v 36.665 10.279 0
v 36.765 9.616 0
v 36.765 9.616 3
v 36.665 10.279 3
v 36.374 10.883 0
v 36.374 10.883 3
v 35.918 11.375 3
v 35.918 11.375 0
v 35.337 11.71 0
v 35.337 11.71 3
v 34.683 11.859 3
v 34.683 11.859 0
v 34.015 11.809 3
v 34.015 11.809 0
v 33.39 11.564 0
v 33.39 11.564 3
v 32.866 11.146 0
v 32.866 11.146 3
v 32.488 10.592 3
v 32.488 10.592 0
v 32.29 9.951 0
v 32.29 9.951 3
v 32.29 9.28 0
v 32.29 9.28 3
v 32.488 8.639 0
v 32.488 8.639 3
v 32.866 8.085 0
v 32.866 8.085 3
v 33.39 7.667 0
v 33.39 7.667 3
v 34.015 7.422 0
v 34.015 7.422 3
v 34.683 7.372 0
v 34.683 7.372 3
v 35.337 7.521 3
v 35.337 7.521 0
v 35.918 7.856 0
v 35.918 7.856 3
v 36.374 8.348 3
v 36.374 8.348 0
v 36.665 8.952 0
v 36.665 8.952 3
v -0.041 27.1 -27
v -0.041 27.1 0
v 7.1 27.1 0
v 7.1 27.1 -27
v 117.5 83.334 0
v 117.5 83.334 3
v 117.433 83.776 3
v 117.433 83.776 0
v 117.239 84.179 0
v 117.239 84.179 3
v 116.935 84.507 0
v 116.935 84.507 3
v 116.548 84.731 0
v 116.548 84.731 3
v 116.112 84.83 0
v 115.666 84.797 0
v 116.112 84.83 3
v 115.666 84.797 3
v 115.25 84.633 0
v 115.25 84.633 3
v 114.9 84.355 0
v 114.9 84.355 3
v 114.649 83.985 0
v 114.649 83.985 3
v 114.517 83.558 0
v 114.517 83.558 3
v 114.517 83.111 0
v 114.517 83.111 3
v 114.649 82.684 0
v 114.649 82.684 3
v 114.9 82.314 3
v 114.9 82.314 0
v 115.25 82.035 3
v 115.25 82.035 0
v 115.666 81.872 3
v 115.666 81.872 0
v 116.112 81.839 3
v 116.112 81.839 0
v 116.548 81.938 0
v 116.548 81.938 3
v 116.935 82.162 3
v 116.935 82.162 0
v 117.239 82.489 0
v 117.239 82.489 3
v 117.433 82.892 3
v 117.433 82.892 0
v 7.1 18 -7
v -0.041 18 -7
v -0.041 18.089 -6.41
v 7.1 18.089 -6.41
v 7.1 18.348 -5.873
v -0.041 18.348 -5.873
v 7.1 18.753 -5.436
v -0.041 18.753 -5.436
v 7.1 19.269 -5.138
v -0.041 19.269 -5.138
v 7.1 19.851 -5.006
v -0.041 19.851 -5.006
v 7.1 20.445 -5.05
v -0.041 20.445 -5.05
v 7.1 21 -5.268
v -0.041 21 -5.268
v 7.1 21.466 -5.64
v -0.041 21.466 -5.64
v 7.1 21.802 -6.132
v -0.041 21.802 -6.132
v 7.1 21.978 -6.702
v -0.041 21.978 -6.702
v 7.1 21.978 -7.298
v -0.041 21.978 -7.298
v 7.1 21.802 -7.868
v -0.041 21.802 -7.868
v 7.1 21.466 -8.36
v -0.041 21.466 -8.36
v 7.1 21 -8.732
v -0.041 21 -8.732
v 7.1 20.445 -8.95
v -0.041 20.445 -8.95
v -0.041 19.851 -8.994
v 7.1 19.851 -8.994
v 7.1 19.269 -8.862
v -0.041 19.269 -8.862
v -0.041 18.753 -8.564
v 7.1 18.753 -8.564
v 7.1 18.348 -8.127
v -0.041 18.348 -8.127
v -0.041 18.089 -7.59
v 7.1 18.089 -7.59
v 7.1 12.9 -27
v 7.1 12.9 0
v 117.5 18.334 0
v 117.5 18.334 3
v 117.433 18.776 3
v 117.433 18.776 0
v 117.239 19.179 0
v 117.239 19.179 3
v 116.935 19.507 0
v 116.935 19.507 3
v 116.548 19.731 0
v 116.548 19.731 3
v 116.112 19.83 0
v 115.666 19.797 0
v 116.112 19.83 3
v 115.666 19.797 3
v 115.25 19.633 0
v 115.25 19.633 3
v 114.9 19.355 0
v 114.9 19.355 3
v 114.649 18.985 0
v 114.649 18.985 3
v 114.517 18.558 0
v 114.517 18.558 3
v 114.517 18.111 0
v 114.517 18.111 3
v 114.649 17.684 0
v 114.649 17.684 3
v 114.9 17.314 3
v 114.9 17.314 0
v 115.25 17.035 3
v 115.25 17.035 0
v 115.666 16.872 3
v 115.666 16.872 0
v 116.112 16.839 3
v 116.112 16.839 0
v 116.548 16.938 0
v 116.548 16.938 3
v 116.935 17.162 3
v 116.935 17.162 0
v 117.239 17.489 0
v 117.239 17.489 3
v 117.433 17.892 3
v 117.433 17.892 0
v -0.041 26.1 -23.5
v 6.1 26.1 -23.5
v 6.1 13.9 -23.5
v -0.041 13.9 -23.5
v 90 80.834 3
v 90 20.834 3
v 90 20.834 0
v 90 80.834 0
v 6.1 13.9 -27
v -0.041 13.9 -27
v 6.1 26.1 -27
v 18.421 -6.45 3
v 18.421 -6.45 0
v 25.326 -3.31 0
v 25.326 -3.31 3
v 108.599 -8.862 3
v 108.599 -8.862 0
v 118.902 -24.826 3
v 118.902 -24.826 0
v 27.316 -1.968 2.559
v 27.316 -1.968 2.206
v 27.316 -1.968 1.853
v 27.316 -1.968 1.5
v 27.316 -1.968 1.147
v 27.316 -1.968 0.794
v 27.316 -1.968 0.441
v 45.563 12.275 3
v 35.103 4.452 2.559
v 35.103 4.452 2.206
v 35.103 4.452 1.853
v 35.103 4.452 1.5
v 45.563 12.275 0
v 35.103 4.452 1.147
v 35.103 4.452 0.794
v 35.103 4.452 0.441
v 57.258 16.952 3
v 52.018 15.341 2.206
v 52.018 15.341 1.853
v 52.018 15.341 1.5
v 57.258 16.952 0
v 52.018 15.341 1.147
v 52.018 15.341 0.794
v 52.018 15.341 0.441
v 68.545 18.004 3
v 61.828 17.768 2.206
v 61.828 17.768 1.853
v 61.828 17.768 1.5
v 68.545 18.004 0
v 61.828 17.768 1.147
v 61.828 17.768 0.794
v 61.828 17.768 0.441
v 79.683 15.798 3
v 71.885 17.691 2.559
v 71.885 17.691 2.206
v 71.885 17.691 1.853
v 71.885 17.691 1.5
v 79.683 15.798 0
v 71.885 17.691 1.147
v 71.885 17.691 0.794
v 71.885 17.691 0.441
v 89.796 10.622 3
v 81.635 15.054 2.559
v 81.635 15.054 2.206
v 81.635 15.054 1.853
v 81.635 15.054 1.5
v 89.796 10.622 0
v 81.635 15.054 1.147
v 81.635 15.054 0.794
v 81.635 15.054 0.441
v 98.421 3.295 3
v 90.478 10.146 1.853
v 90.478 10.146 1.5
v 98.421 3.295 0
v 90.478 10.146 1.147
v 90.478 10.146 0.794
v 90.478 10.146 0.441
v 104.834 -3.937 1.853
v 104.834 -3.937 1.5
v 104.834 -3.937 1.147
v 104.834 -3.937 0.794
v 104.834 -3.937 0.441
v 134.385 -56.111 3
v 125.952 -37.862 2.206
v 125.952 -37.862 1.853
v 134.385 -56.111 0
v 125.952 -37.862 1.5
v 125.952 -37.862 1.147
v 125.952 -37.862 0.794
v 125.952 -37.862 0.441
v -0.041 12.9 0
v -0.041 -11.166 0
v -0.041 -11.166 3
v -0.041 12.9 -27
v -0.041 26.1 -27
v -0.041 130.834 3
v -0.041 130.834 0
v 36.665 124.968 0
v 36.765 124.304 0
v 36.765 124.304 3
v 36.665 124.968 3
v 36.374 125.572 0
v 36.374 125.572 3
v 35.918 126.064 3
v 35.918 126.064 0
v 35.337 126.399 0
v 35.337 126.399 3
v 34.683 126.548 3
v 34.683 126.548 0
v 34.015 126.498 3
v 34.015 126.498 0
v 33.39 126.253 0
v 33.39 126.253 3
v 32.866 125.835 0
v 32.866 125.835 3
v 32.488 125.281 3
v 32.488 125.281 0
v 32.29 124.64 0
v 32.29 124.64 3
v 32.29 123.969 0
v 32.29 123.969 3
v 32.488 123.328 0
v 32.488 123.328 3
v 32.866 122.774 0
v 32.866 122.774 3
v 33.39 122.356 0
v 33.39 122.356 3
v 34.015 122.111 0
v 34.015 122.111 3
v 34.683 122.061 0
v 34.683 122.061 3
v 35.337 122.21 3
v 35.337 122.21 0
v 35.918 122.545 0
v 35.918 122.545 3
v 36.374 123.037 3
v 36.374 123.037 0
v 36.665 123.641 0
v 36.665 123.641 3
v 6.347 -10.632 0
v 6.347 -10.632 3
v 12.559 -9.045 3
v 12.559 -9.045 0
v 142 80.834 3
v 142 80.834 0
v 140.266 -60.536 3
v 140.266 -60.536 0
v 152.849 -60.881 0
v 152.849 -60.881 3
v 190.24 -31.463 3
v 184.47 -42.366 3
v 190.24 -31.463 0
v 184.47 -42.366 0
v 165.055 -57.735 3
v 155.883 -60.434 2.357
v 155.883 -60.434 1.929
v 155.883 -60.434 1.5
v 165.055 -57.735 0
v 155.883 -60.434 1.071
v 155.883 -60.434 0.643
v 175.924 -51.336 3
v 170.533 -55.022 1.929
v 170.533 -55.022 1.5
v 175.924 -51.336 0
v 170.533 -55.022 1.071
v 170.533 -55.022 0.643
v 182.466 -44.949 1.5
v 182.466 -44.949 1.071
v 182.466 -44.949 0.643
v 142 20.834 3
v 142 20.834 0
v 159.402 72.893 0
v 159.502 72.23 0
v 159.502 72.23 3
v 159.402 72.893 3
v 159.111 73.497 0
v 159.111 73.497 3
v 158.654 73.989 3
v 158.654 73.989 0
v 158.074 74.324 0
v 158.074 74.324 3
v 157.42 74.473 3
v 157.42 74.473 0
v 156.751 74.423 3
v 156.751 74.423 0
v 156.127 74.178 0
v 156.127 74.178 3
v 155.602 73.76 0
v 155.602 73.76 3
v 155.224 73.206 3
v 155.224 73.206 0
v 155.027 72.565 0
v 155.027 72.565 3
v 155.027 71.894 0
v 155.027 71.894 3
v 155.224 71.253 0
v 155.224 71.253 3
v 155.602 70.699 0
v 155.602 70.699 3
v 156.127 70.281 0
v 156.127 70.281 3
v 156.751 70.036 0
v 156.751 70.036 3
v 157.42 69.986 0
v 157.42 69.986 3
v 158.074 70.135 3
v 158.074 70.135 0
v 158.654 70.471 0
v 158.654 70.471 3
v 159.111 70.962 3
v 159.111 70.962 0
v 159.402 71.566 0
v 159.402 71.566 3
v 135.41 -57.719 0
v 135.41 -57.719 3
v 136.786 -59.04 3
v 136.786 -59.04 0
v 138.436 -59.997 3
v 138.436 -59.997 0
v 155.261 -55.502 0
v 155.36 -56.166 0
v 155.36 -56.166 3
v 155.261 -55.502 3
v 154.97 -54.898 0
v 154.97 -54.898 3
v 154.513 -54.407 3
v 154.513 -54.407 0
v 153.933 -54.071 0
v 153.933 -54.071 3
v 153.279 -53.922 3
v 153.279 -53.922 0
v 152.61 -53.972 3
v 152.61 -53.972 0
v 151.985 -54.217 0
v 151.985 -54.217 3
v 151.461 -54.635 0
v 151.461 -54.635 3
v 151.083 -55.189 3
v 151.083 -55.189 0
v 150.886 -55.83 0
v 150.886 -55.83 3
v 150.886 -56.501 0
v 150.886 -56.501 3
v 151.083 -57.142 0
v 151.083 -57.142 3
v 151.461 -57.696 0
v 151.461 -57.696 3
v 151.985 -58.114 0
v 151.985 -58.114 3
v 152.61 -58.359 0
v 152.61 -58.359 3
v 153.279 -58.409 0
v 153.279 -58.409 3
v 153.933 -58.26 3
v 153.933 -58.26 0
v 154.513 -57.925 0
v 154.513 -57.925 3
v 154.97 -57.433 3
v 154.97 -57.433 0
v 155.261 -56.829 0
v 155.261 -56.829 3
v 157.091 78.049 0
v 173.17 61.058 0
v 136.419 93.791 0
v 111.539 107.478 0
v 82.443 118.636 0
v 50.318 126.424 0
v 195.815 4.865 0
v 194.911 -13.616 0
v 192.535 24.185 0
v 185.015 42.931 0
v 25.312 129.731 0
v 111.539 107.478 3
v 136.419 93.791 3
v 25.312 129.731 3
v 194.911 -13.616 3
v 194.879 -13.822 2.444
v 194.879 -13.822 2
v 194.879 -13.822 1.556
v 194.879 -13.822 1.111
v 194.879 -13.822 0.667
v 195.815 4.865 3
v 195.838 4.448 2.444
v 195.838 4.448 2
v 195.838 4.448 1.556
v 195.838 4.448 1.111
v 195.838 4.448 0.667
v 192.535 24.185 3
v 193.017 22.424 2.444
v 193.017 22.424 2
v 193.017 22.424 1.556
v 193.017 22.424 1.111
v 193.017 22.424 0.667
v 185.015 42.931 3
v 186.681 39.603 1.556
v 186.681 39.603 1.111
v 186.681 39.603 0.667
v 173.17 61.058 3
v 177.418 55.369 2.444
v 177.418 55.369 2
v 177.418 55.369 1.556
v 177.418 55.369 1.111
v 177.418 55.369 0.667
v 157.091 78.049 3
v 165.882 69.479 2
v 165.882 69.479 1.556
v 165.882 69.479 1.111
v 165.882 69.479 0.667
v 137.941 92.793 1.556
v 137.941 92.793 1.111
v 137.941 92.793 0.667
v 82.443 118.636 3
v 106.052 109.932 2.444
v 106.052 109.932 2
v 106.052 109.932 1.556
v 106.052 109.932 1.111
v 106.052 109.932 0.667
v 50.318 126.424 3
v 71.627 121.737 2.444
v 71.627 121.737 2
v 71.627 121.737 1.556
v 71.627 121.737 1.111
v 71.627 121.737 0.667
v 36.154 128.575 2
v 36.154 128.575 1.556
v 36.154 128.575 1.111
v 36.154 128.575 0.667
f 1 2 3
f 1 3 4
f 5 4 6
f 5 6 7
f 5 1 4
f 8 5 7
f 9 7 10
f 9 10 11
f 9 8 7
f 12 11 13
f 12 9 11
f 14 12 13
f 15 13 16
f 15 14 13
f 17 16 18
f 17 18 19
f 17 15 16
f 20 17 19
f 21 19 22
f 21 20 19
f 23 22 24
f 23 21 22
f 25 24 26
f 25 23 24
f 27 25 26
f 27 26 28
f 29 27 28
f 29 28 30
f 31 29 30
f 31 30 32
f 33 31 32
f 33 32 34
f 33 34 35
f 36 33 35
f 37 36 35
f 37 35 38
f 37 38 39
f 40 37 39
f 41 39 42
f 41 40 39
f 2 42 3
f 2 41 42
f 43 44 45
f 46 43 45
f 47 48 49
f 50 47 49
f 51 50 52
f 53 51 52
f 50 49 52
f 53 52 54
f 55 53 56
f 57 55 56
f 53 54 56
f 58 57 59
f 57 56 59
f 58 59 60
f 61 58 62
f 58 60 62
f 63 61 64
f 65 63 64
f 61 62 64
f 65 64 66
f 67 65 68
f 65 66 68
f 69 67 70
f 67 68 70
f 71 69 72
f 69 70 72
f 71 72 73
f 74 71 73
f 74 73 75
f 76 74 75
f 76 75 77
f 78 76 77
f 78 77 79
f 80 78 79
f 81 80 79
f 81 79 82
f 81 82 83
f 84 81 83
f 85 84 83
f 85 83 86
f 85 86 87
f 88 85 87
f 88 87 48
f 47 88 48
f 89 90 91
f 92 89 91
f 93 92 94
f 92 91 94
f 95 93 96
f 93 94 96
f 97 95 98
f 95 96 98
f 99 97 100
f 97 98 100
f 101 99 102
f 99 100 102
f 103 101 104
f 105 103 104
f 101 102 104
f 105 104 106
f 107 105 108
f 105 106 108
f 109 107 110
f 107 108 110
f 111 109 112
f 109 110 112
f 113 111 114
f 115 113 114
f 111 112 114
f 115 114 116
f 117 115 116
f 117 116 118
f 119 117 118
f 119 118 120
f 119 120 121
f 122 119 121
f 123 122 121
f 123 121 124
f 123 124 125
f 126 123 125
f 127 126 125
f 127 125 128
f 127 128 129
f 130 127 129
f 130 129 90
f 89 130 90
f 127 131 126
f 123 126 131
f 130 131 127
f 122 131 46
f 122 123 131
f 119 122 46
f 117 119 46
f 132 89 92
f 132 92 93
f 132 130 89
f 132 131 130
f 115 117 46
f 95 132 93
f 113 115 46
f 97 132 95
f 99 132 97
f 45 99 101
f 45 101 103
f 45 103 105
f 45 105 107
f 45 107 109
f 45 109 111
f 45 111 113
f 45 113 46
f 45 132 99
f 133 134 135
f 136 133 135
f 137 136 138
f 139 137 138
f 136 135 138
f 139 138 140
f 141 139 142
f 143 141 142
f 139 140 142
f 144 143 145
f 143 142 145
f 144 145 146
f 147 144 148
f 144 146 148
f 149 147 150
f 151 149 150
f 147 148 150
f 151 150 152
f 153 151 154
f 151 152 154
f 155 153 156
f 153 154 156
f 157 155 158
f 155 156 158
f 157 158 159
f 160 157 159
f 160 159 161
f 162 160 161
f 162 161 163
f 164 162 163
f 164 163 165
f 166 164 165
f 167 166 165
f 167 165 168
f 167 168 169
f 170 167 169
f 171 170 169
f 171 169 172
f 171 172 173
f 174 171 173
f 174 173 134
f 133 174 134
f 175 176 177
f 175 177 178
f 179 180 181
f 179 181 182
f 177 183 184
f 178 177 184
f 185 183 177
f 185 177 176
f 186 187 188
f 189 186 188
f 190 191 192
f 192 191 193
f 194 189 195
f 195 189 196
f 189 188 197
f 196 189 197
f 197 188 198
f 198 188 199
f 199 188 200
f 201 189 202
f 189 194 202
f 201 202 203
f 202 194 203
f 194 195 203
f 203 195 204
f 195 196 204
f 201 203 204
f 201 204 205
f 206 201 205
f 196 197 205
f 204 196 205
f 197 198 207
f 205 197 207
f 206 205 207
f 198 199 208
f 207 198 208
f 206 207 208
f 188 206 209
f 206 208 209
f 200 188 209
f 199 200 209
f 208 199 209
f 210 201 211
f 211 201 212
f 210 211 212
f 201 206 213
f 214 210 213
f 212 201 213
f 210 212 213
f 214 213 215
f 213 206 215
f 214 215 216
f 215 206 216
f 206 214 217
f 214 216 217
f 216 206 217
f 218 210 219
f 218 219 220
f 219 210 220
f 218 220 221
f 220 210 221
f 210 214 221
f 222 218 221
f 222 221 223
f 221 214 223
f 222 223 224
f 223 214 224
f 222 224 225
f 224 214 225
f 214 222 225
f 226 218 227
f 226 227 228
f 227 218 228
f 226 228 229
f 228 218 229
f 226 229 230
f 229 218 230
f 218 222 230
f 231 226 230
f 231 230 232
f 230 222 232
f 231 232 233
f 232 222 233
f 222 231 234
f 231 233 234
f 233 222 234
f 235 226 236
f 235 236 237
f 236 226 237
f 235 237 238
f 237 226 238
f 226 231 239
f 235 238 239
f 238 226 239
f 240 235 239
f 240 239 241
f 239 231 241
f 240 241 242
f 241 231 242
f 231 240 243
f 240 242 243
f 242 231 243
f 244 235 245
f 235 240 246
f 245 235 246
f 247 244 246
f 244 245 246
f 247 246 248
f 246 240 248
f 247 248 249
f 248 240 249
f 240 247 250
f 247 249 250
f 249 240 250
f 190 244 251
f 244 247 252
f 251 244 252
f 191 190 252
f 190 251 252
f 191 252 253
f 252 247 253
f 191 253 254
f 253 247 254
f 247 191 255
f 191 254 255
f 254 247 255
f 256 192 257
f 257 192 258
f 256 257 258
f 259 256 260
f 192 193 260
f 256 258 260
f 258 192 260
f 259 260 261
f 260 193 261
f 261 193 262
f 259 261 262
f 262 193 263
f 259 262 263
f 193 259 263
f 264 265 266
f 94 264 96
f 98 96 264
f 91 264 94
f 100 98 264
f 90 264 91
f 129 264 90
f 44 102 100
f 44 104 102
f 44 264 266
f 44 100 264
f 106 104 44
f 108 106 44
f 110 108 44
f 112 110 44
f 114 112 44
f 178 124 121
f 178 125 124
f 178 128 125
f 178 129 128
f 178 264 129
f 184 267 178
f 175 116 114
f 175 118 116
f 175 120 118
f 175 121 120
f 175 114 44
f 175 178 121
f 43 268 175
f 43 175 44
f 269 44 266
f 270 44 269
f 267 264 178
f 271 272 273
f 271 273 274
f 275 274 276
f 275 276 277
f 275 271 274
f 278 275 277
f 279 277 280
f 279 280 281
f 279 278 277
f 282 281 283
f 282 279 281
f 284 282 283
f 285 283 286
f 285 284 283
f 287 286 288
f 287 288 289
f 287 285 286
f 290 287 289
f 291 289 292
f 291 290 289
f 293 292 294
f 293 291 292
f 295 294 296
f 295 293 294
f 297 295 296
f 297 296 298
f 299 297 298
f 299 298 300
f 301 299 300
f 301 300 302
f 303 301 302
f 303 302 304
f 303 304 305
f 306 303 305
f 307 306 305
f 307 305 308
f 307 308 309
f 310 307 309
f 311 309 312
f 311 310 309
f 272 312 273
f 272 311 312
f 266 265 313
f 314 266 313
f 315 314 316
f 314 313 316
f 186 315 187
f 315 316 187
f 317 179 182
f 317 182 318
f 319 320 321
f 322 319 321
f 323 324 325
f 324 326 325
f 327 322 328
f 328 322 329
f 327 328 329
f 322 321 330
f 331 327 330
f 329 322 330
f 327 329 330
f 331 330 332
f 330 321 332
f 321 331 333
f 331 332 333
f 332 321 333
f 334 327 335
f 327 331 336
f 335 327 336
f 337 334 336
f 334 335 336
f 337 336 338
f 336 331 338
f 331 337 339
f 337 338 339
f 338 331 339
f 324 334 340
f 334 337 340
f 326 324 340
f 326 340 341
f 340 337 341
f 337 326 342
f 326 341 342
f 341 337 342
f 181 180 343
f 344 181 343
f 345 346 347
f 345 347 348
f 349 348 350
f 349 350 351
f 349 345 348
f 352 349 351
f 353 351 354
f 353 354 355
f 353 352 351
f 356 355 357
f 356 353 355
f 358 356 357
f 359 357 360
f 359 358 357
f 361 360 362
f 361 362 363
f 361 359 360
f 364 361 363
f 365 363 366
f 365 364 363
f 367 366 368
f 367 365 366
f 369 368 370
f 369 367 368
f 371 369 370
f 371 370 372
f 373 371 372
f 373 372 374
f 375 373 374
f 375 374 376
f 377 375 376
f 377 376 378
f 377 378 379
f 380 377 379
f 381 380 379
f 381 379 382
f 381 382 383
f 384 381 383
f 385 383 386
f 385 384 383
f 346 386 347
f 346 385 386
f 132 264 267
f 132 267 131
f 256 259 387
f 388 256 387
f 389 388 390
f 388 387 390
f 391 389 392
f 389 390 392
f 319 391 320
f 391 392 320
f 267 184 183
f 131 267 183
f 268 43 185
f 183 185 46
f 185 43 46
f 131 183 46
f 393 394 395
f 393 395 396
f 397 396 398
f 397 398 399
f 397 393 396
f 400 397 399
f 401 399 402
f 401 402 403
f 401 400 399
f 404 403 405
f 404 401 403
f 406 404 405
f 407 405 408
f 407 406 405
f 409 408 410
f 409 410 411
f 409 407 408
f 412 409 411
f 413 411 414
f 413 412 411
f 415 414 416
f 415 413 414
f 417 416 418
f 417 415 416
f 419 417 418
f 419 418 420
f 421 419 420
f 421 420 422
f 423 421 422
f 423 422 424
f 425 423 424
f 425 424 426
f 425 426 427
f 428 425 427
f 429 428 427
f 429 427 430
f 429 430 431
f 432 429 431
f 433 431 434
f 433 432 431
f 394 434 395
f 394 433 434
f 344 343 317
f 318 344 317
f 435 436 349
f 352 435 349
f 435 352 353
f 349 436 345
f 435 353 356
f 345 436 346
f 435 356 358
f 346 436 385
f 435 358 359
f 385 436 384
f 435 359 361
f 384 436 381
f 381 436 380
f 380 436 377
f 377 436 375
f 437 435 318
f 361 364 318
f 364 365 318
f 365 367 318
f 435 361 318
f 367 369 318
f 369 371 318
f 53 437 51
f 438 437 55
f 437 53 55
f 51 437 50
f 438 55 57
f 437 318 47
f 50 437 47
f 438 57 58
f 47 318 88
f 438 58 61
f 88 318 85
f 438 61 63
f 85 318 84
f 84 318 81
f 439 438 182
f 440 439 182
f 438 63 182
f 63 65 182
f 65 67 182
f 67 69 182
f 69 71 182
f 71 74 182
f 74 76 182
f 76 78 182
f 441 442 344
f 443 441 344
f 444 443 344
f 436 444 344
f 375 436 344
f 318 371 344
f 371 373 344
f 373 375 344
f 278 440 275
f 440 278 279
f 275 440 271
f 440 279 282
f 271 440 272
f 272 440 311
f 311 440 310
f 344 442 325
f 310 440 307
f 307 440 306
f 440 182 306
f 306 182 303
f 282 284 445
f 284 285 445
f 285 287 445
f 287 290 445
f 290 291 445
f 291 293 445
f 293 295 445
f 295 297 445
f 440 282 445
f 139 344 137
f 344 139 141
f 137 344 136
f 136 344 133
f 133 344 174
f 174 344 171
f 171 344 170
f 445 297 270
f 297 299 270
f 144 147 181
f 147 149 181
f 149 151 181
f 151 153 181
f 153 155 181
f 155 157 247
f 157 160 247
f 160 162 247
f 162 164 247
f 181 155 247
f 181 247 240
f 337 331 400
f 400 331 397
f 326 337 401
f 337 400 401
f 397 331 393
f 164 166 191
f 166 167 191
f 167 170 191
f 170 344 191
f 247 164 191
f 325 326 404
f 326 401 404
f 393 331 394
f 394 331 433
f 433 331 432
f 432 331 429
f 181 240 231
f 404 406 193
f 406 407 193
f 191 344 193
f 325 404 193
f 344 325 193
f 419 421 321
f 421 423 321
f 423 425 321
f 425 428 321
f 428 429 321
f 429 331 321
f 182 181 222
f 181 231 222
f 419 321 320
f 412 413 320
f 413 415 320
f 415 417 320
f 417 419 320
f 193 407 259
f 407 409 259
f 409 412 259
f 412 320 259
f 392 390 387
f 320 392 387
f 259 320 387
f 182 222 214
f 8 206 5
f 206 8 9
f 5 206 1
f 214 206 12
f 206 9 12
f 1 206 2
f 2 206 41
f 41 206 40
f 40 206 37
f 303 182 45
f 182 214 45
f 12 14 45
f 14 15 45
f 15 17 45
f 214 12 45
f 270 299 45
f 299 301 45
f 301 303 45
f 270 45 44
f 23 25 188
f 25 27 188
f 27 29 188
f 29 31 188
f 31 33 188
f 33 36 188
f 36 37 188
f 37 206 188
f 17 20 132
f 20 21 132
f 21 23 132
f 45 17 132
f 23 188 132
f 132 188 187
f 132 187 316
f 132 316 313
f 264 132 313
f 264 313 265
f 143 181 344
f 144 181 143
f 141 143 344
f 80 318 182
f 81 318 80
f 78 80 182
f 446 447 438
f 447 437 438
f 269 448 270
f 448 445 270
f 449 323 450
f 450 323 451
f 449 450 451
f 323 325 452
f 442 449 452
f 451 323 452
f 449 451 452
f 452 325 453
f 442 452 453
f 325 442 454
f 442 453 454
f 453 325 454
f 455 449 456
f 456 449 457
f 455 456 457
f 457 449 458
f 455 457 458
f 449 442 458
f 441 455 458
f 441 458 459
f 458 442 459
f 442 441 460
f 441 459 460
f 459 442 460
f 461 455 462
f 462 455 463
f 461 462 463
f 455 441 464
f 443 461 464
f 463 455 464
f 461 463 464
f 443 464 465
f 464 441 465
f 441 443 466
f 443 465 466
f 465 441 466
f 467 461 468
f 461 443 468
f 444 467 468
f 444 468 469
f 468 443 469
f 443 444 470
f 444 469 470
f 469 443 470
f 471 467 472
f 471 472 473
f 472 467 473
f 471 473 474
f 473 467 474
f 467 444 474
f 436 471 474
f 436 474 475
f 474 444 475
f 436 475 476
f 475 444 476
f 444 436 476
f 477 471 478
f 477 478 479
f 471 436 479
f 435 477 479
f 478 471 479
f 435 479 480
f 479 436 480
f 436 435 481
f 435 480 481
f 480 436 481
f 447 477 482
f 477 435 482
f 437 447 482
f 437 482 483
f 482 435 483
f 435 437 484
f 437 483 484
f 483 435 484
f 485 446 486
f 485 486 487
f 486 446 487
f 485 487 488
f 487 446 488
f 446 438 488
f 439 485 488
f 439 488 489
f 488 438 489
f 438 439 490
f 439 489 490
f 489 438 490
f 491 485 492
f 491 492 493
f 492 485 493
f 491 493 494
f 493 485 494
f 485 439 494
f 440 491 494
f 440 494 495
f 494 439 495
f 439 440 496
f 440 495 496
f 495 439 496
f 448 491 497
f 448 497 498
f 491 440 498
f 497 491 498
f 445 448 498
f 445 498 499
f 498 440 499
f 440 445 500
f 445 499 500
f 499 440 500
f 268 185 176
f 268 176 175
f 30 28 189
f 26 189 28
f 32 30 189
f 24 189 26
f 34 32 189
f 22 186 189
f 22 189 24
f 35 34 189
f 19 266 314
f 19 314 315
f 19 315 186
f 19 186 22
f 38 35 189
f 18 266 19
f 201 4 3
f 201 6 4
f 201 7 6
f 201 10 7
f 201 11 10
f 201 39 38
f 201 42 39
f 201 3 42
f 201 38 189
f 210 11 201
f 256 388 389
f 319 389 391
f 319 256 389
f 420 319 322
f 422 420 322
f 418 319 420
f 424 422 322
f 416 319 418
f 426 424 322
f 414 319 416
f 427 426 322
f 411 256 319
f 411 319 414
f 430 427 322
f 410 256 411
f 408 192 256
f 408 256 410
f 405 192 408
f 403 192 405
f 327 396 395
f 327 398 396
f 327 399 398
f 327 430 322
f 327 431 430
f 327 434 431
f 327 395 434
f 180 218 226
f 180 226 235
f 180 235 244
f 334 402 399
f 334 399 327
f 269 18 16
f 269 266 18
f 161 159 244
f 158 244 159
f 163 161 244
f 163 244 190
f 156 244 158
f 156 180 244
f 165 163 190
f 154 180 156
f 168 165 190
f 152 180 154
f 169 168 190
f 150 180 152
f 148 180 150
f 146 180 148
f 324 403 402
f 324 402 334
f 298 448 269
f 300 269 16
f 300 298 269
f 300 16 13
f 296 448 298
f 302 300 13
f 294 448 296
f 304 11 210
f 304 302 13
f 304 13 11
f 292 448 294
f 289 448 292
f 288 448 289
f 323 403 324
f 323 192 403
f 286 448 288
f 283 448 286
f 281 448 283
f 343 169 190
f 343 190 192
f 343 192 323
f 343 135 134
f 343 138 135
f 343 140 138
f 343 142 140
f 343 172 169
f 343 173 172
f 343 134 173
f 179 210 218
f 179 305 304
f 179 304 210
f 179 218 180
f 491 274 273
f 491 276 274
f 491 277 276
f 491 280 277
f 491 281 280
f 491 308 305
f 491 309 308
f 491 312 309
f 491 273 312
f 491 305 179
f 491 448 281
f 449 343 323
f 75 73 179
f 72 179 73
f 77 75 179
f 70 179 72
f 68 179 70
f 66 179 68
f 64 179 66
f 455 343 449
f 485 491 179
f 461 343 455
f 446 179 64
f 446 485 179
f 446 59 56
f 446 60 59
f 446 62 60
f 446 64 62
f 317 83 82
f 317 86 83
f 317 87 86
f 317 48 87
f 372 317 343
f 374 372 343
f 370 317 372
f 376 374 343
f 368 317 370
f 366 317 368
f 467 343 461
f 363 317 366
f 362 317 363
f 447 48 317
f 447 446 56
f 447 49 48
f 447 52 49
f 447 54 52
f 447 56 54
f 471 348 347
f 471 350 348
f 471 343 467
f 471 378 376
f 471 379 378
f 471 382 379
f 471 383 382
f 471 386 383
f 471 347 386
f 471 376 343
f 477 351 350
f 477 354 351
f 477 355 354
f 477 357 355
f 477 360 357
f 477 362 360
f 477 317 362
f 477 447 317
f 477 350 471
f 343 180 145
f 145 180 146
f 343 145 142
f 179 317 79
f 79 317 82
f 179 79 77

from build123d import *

# Parameters (mm, degrees)
CROQUIS7_R                 = 2.25
CROQUIS7_R_2               = 2
SALIENTE_EXTRUIR5_DEPTH    = 3
CROQUIS8_W                 = 14.2
CROQUIS8_H                 = 14.2
SALIENTE_EXTRUIR6_DEPTH    = 30
CROQUIS9_W                 = 12.2
CROQUIS9_H                 = 12.2
CORTAR_EXTRUIR3_DEPTH      = 3.5
CROQUIS10_R                = 1.5
CROQUIS10_W                = 52
CROQUIS10_H                = 60
CORTAR_EXTRUIR4_DEPTH      = 10
CROQUIS11_R                = 2
CORTAR_EXTRUIR5_DEPTH      = 244.062677057
CORTAR_EXTRUIR6_DEPTH      = 10
CORTAR_EXTRUIR6_DEPTH_BACK = 40


with BuildPart() as part:
    # Croquis7 → Saliente-Extruir5 (new body)
    with BuildSketch(Plane(origin=(0, 0, 0), x_dir=(-1, 0, 0), z_dir=(0, 0, 1))):
        with BuildLine():
            ThreePointArc((140.348102944, 60.535906772), (136.868803986, 59.039740818), (134.467588313, 56.110884882))
            add(Edge.make_bspline(
                [(134.467588313, 56.110884882), (134.149654238, 55.334133411), (133.822967437, 54.561974551), (133.162468089, 53.021395753), (132.827829682, 52.253409151), (131.813137405, 49.95510413), (129.740491118, 45.381193792), (127.554094799, 40.866968809), (124.537000873, 34.901469121), (122.977142227, 31.945642839), (119.740627649, 26.095274542), (118.063871011, 23.200785369), (115.441409795, 18.91536637), (114.549338579, 17.496294783), (112.72383113, 14.679856092), (111.790405163, 13.282650688), (108.93090019, 9.143306555), (106.942158815, 6.448783713), (103.789519774, 2.5408027), (102.709995436, 1.260750849), (101.03852657, -0.618140745), (100.472644941, -1.237551258), (99.321371183, -2.460973153), (98.735216612, -3.065706766), (96.949611744, -4.848397798), (95.725315546, -5.992490783), (93.193460811, -8.17168186), (91.885551874, -9.206321258), (89.163749912, -11.136861166), (87.750446472, -12.033533472), (85.542380661, -13.263200338), (84.789940556, -13.654501875), (83.273337808, -14.386945731), (82.507210908, -14.729300557), (80.185156663, -15.684162987), (78.605545886, -16.224438396), (76.18690973, -16.88473526), (75.372506069, -17.079850593), (73.726807841, -17.418565616), (72.893614615, -17.562445585), (68.705243638, -18.145869815), (65.366316414, -18.172349369), (61.206552273, -17.685687456), (60.375297364, -17.562248247), (58.714202725, -17.262432714), (57.885084071, -17.085992517), (55.432802766, -16.486020136), (53.833347943, -15.990242323), (50.701372835, -14.817551431), (49.168805031, -14.140766948), (46.919374597, -12.991848579), (46.176109393, -12.585433423), (44.71844096, -11.734682347), (44.00330992, -11.290078896), (41.89786804, -9.900210079), (40.548675898, -8.897248108), (37.915404815, -6.799959147), (36.631444442, -5.705240729), (34.080234787, -3.494531224), (32.813017874, -2.37801674), (30.236662295, -0.200762722), (28.927839074, 0.860396497), (26.200660035, 2.836986891), (24.782534521, 3.752724475), (22.513326989, 4.937380803), (21.731218891, 5.30092632), (20.538800155, 5.779648827), (20.137325925, 5.928599802), (19.528876591, 6.135464876), (19.325056364, 6.201754934), (18.915138447, 6.32828856), (18.709169476, 6.388873867), (18.503492991, 6.450235701)],
                knots=[0, 0, 0, 0, 0.015625, 0.015625, 0.03125, 0.03125, 0.0625, 0.125, 0.125, 0.1875, 0.1875, 0.25, 0.25, 0.28125, 0.28125, 0.3125, 0.3125, 0.375, 0.375, 0.40625, 0.40625, 0.421875, 0.421875, 0.4375, 0.4375, 0.46875, 0.46875, 0.5, 0.5, 0.53125, 0.53125, 0.546875, 0.546875, 0.5625, 0.5625, 0.59375, 0.59375, 0.609375, 0.609375, 0.625, 0.625, 0.6875, 0.6875, 0.703125, 0.703125, 0.71875, 0.71875, 0.75, 0.75, 0.78125, 0.78125, 0.796875, 0.796875, 0.8125, 0.8125, 0.84375, 0.84375, 0.875, 0.875, 0.90625, 0.90625, 0.9375, 0.9375, 0.96875, 0.96875, 0.984375, 0.984375, 0.9921875, 0.9921875, 0.99609375, 0.99609375, 1, 1, 1, 1], degree=3))
            ThreePointArc((18.503492991, 6.450235701), (9.568725558, 9.968187997), (0.041286445, 11.165669263))
            ThreePointArc((0.041286445, 11.165669263), (-9.486152668, 9.968187997), (-18.420920101, 6.450235701))
            add(Edge.make_bspline(
                [(-18.420920101, 6.450235701), (-18.623940111, 6.389666404), (-18.827355959, 6.329830822), (-19.231521602, 6.205217931), (-19.432092857, 6.140109685), (-20.029834347, 5.937422038), (-20.422847663, 5.792137477), (-21.586408936, 5.327592923), (-23.851571133, 4.283655696), (-25.957152112, 2.943922804), (-27.995784216, 1.480095188), (-28.664890842, 0.970984568), (-29.983921002, -0.073329511), (-31.932785293, -1.677966714), (-33.830609801, -3.348234863), (-37.648198778, -6.660559044), (-40.223642402, -8.829704647), (-43.732103414, -11.16931662), (-44.447751487, -11.619293464), (-45.90833942, -12.481581481), (-46.654055565, -12.894111913), (-48.910026429, -14.05945093), (-50.447191979, -14.745557377), (-53.587886072, -15.936216829), (-55.191605427, -16.440247818), (-57.65002542, -17.051733947), (-58.478840799, -17.231454942), (-60.152957814, -17.539864916), (-60.990189376, -17.667132679), (-65.177200996, -18.170568112), (-68.529524477, -18.150830669), (-72.723459823, -17.57652989), (-73.56537326, -17.433195972), (-75.227722525, -17.094199895), (-76.049649818, -16.898572429), (-78.48861692, -16.235921786), (-80.078810549, -15.693041625), (-82.413070582, -14.734529063), (-83.182665748, -14.391031128), (-84.704996506, -13.656396586), (-85.459349689, -13.264347284), (-87.686334065, -12.023619951), (-89.109100698, -11.119013238), (-91.845960574, -9.173794538), (-93.159325686, -8.13227129), (-95.699651961, -5.941089833), (-96.92657944, -4.791389468), (-99.311327975, -2.405501713), (-100.470747098, -1.167746926), (-102.705277757, 1.350255866), (-103.784333544, 2.63413345), (-106.931979291, 6.54404893), (-108.909553818, 9.229342103), (-112.69311531, 14.711639925), (-114.498345943, 17.509136981), (-117.975283478, 23.191061246), (-119.646743776, 26.075649006), (-122.879072623, 31.916824892), (-124.439905913, 34.873435974), (-127.463527635, 40.850489896), (-128.925763536, 43.869333899), (-131.039316303, 48.429617131), (-132.076557677, 50.718681564), (-133.080557539, 53.0229294), (-133.740912999, 54.563195318), (-134.0674355, 55.334997841), (-134.385015461, 56.110884961)],
                knots=[0, 0, 0, 0, 0.00390625, 0.00390625, 0.0078125, 0.0078125, 0.015625, 0.015625, 0.03125, 0.0625, 0.0625, 0.078125, 0.078125, 0.09375, 0.125, 0.125, 0.1875, 0.1875, 0.203125, 0.203125, 0.21875, 0.21875, 0.25, 0.25, 0.28125, 0.28125, 0.296875, 0.296875, 0.3125, 0.3125, 0.375, 0.375, 0.390625, 0.390625, 0.40625, 0.40625, 0.4375, 0.4375, 0.453125, 0.453125, 0.46875, 0.46875, 0.5, 0.5, 0.53125, 0.53125, 0.5625, 0.5625, 0.59375, 0.59375, 0.625, 0.625, 0.6875, 0.6875, 0.75, 0.75, 0.8125, 0.8125, 0.875, 0.875, 0.9375, 0.9375, 0.96875, 0.984375, 0.984375, 1, 1, 1, 1], degree=3))
            ThreePointArc((-134.385015461, 56.110884961), (-136.786231132, 59.039740844), (-140.265530055, 60.535906772))
            add(Edge.make_bspline(
                [(-140.265530055, 60.535906772), (-142.869313612, 60.975194236), (-145.472736764, 61.181545126), (-149.377353564, 61.156324129), (-150.678805664, 61.091795359), (-152.630851923, 60.909758714), (-153.281511997, 60.834852812), (-154.582787463, 60.656161872), (-155.234853603, 60.552101706), (-158.476802726, 59.961533397), (-160.993294496, 59.270458626), (-164.656700058, 57.918026872), (-165.859171506, 57.414272212), (-167.634457246, 56.578016163), (-168.221475639, 56.285808038), (-169.38587085, 55.674041203), (-169.964457435, 55.353726594), (-172.807439805, 53.697511994), (-174.937398486, 52.192576754), (-177.922607968, 49.673841605), (-178.882521506, 48.790456721), (-180.268716868, 47.398497719), (-180.721823613, 46.9233488), (-181.609804133, 45.950331764), (-182.044492036, 45.452521121), (-184.149785555, 42.932694997), (-185.636363328, 40.798932433), (-188.228703234, 36.30425224), (-189.334510792, 33.943361708), (-190.239592269, 31.46273884)],
                knots=[0, 0, 0, 0, 0.125, 0.125, 0.1875, 0.1875, 0.21875, 0.21875, 0.25, 0.25, 0.375, 0.375, 0.4375, 0.4375, 0.46875, 0.46875, 0.5, 0.5, 0.625, 0.625, 0.6875, 0.6875, 0.71875, 0.71875, 0.75, 0.75, 0.875, 0.875, 1, 1, 1, 1], degree=3))
            add(Edge.make_bspline(
                [(-190.239592269, 31.46273884), (-192.375255576, 25.696350204), (-193.930960398, 19.817912179), (-195.353011767, 10.824149994), (-195.674576312, 7.796775057), (-195.917624035, 3.209479486), (-195.95859604, 1.668142737), (-195.958829749, -1.399076424), (-195.918430127, -2.92654924), (-195.518471979, -10.533929614), (-194.56743795, -16.524250265), (-192.629288141, -23.898650857), (-192.204015591, -25.3678295), (-191.509820309, -27.563072124), (-191.268868279, -28.293875271), (-190.770797886, -29.745373087), (-190.513422668, -30.466933466), (-189.18582541, -34.054284362), (-187.99353352, -36.858768915), (-185.368434906, -42.346946573), (-183.935518187, -45.030584436), (-181.616583515, -48.97088495), (-180.815309976, -50.270107971), (-179.15756631, -52.840833163), (-178.299496505, -54.114584529), (-173.894487634, -60.387567833), (-170.029043597, -65.071235074), (-161.734486632, -73.885990461), (-157.304059995, -78.015790745), (-151.455251464, -82.873380155), (-150.269861365, -83.829577122), (-147.868570878, -85.712061036), (-146.651110312, -86.639504887), (-142.965561618, -89.369434932), (-140.47059657, -91.115230775), (-132.88142891, -96.148767416), (-127.683244876, -99.23322641), (-117.044436945, -104.928178838), (-111.603518482, -107.538096399), (-100.500242462, -112.325022089), (-94.837739322, -114.501745604), (-87.628813583, -116.966944585), (-86.180135392, -117.447244101), (-83.281186284, -118.37891039), (-78.92614565, -119.734494508), (-74.551754575, -120.967502962), (-65.778285791, -123.277142009), (-59.896441582, -124.608717398), (-48.071099861, -126.88132439), (-42.127581641, -127.822224818), (-30.181011709, -129.326909852), (-18.174890213, -130.454364585), (-6.05076732, -130.834337664), (0.041286395, -130.834337718)],
                knots=[0, 0, 0, 0, 0.0625, 0.0625, 0.09375, 0.09375, 0.109375, 0.109375, 0.125, 0.125, 0.1875, 0.1875, 0.203125, 0.203125, 0.2109375, 0.2109375, 0.21875, 0.21875, 0.25, 0.25, 0.28125, 0.28125, 0.296875, 0.296875, 0.3125, 0.3125, 0.375, 0.375, 0.4375, 0.4375, 0.453125, 0.453125, 0.46875, 0.46875, 0.5, 0.5, 0.5625, 0.5625, 0.625, 0.625, 0.6875, 0.6875, 0.703125, 0.703125, 0.71875, 0.75, 0.75, 0.8125, 0.8125, 0.875, 0.875, 0.9375, 1, 1, 1, 1], degree=3))
            add(Edge.make_bspline(
                [(0.041286395, -130.834337718), (6.134538372, -130.834337861), (18.261394111, -130.454215542), (30.270890379, -129.326191765), (42.221146328, -127.820644803), (48.166664918, -126.879178393), (59.996316501, -124.605051093), (65.880471618, -123.272531195), (74.657643286, -120.961098273), (79.033976886, -119.727301499), (83.391005428, -118.370478603), (86.291297223, -117.437928825), (87.740322905, -116.957264458), (94.94849915, -114.491286465), (100.612718757, -112.313197934), (111.723756279, -107.520808049), (117.170703974, -104.9067671), (127.825648694, -99.19923472), (133.033931688, -96.106317082), (139.373186051, -91.896862023), (140.632464259, -91.037770104), (143.133063373, -89.283555245), (144.374861494, -88.388007586), (148.052238664, -85.660160511), (150.446425915, -83.782144112), (157.447735696, -77.960356266), (161.874926497, -73.830213662), (168.100826372, -67.205265408), (170.107260305, -64.925618709), (173.00207465, -61.387202315), (173.947865617, -60.187897794), (175.799183824, -57.747584062), (176.704009528, -56.507250952), (181.087838152, -50.248918472), (184.175371038, -45.022352222), (188.097143692, -36.810598338), (189.285816024, -34.01118958), (190.610308183, -30.427356556), (190.867135429, -29.70635937), (191.364231806, -28.255685919), (191.604838096, -27.524920821), (192.298313078, -25.328623504), (192.722722681, -23.859837654), (194.655712304, -16.493027919), (195.598905702, -10.526579041), (196.07921656, -1.463811899), (196.083096745, 1.576017168), (195.845385004, 6.165233834), (195.724990331, 7.703216662), (195.405329025, 10.754442145), (195.206051361, 12.271290951), (194.017367953, 19.812812816), (192.45374436, 25.709911997), (190.316013842, 31.479461946)],
                knots=[0, 0, 0, 0, 0.0625, 0.125, 0.125, 0.1875, 0.1875, 0.25, 0.25, 0.28125, 0.296875, 0.296875, 0.3125, 0.3125, 0.375, 0.375, 0.4375, 0.4375, 0.5, 0.5, 0.515625, 0.515625, 0.53125, 0.53125, 0.5625, 0.5625, 0.625, 0.625, 0.65625, 0.65625, 0.671875, 0.671875, 0.6875, 0.6875, 0.75, 0.75, 0.78125, 0.78125, 0.7890625, 0.7890625, 0.796875, 0.796875, 0.8125, 0.8125, 0.875, 0.875, 0.90625, 0.90625, 0.921875, 0.921875, 0.9375, 0.9375, 1, 1, 1, 1], degree=3))
            ThreePointArc((190.316013842, 31.479461946), (170.584652034, 55.040486981), (140.348102944, 60.535906772))
        make_face()
        with Locations(Location((-153.110491216, 56.165669263, 0), (0, 0, 180))):
            Circle(CROQUIS7_R, mode=Mode.SUBTRACT)
        with Locations(Location((-34.515211049, -9.615590181, 0), (0, 0, 180))):
            Circle(CROQUIS7_R, mode=Mode.SUBTRACT)
        with Locations(Location((34.597783939, -9.615590181, 0), (0, 0, 180))):
            Circle(CROQUIS7_R_2, mode=Mode.SUBTRACT)
        with Locations(Location((153.193064106, 56.165669263, 0), (0, 0, 180))):
            Circle(CROQUIS7_R_2, mode=Mode.SUBTRACT)
        with Locations(Location((-157.251517535, -72.229628149, 0), (0, 0, 180))):
            Circle(CROQUIS7_R, mode=Mode.SUBTRACT)
        with Locations(Location((-34.515211049, -124.304498834, 0), (0, 0, 180))):
            Circle(CROQUIS7_R, mode=Mode.SUBTRACT)
        with Locations(Location((34.597783939, -124.304498834, 0), (0, 0, 180))):
            Circle(CROQUIS7_R_2, mode=Mode.SUBTRACT)
        with Locations(Location((157.334090424, -71.312448831, 0), (0, 0, 180))):
            Circle(CROQUIS7_R_2, mode=Mode.SUBTRACT)
    extrude(amount=SALIENTE_EXTRUIR5_DEPTH)

    # Croquis8 → Saliente-Extruir6 (add)
    with BuildSketch(Plane.XY.offset(3)):
        with Locations((0, 20)):
            Rectangle(CROQUIS8_W, CROQUIS8_H)
    extrude(amount=-SALIENTE_EXTRUIR6_DEPTH)

    # Croquis9 → Cortar-Extruir3 (cut)
    with BuildSketch(Plane(origin=(0, 0, -27), x_dir=(-1, 0, 0), z_dir=(0, 0, -1))):
        with Locations((0, 20)):
            Rectangle(CROQUIS9_W, CROQUIS9_H)
    extrude(amount=-CORTAR_EXTRUIR3_DEPTH, mode=Mode.SUBTRACT)

    # Croquis10 → Cortar-Extruir4 (cut)
    with BuildSketch(Plane.XY.offset(3)):
        with Locations((116, 83.334330737)):
            Circle(CROQUIS10_R)
        with Locations((116, 18.334330737)):
            Circle(CROQUIS10_R)
        with Locations((116, 50.834330737)):
            Rectangle(CROQUIS10_W, CROQUIS10_H)
    extrude(amount=-CORTAR_EXTRUIR4_DEPTH, mode=Mode.SUBTRACT)

    # Croquis11 → Cortar-Extruir5 (cut, through all)
    with BuildSketch(Plane.ZY.offset(7.1)):
        with Locations(Location((-7, 20, 0), (0, 0, 270))):
            Circle(CROQUIS11_R)
    extrude(amount=-CORTAR_EXTRUIR5_DEPTH, mode=Mode.SUBTRACT)

    # Croquis12 → Cortar-Extruir6 (cut, two sides: drawn at the far end of the back side and taken through both)
    with BuildSketch(Plane.XY.offset(3).offset(-CORTAR_EXTRUIR6_DEPTH_BACK)):
        with BuildLine():
            Line((-0.041286395, -11.165669263), (-0.041286395, 130.834337718))
            add(Edge.make_bspline(
                [(-0.041286395, 130.834337718), (-6.134538372, 130.834337861), (-18.261394111, 130.454215542), (-30.270890379, 129.326191765), (-42.221146328, 127.820644803), (-48.166664918, 126.879178393), (-59.996316501, 124.605051093), (-65.880471618, 123.272531195), (-74.657643286, 120.961098273), (-79.033976886, 119.727301499), (-83.391005428, 118.370478603), (-86.291297223, 117.437928825), (-87.740322905, 116.957264458), (-94.94849915, 114.491286465), (-100.612718757, 112.313197934), (-111.723756279, 107.520808049), (-117.170703974, 104.9067671), (-127.825648694, 99.19923472), (-133.033931688, 96.106317082), (-139.373186051, 91.896862023), (-140.632464259, 91.037770104), (-143.133063373, 89.283555245), (-144.374861494, 88.388007586), (-148.052238664, 85.660160511), (-150.446425915, 83.782144112), (-157.447735696, 77.960356266), (-161.874926497, 73.830213662), (-168.100826372, 67.205265408), (-170.107260305, 64.925618709), (-173.00207465, 61.387202315), (-173.947865617, 60.187897794), (-175.799183824, 57.747584062), (-176.704009528, 56.507250952), (-181.087838152, 50.248918472), (-184.175371038, 45.022352222), (-188.097143692, 36.810598338), (-189.285816024, 34.01118958), (-190.610308183, 30.427356556), (-190.867135429, 29.70635937), (-191.364231806, 28.255685919), (-191.604838096, 27.524920821), (-192.298313078, 25.328623504), (-192.722722681, 23.859837654), (-194.655712304, 16.493027919), (-195.598905702, 10.526579041), (-196.07921656, 1.463811899), (-196.083096745, -1.576017168), (-195.845385004, -6.165233834), (-195.724990331, -7.703216662), (-195.405329025, -10.754442145), (-195.206051361, -12.271290951), (-194.017367953, -19.812812816), (-192.45374436, -25.709911997), (-190.316013842, -31.479461946)],
                knots=[0, 0, 0, 0, 0.0625, 0.125, 0.125, 0.1875, 0.1875, 0.25, 0.25, 0.28125, 0.296875, 0.296875, 0.3125, 0.3125, 0.375, 0.375, 0.4375, 0.4375, 0.5, 0.5, 0.515625, 0.515625, 0.53125, 0.53125, 0.5625, 0.5625, 0.625, 0.625, 0.65625, 0.65625, 0.671875, 0.671875, 0.6875, 0.6875, 0.75, 0.75, 0.78125, 0.78125, 0.7890625, 0.7890625, 0.796875, 0.796875, 0.8125, 0.8125, 0.875, 0.875, 0.90625, 0.90625, 0.921875, 0.921875, 0.9375, 0.9375, 1, 1, 1, 1], degree=3))
            ThreePointArc((-190.316013842, -31.479461946), (-170.584652034, -55.040486981), (-140.348102944, -60.535906772))
            ThreePointArc((-140.348102944, -60.535906772), (-136.868803986, -59.039740818), (-134.467588313, -56.110884882))
            add(Edge.make_bspline(
                [(-134.467588313, -56.110884882), (-134.149654238, -55.334133411), (-133.822967437, -54.561974551), (-133.162468089, -53.021395753), (-132.827829682, -52.253409151), (-131.813137405, -49.95510413), (-129.740491118, -45.381193792), (-127.554094799, -40.866968809), (-124.537000873, -34.901469121), (-122.977142227, -31.945642839), (-119.740627649, -26.095274542), (-118.063871011, -23.200785369), (-115.441409795, -18.91536637), (-114.549338579, -17.496294783), (-112.72383113, -14.679856092), (-111.790405163, -13.282650688), (-108.93090019, -9.143306555), (-106.942158815, -6.448783713), (-103.789519774, -2.5408027), (-102.709995436, -1.260750849), (-101.03852657, 0.618140745), (-100.472644941, 1.237551258), (-99.321371183, 2.460973153), (-98.735216612, 3.065706766), (-96.949611744, 4.848397798), (-95.725315546, 5.992490783), (-93.193460811, 8.17168186), (-91.885551874, 9.206321258), (-89.163749912, 11.136861166), (-87.750446472, 12.033533472), (-85.542380661, 13.263200338), (-84.789940556, 13.654501875), (-83.273337808, 14.386945731), (-82.507210908, 14.729300557), (-80.185156663, 15.684162987), (-78.605545886, 16.224438396), (-76.18690973, 16.88473526), (-75.372506069, 17.079850593), (-73.726807841, 17.418565616), (-72.893614615, 17.562445585), (-68.705243638, 18.145869815), (-65.366316414, 18.172349369), (-61.206552273, 17.685687456), (-60.375297364, 17.562248247), (-58.714202725, 17.262432714), (-57.885084071, 17.085992517), (-55.432802766, 16.486020136), (-53.833347943, 15.990242323), (-50.701372835, 14.817551431), (-49.168805031, 14.140766948), (-46.919374597, 12.991848579), (-46.176109393, 12.585433423), (-44.71844096, 11.734682347), (-44.00330992, 11.290078896), (-41.89786804, 9.900210079), (-40.548675898, 8.897248108), (-37.915404815, 6.799959147), (-36.631444442, 5.705240729), (-34.080234787, 3.494531224), (-32.813017874, 2.37801674), (-30.236662295, 0.200762722), (-28.927839074, -0.860396497), (-26.200660035, -2.836986891), (-24.782534521, -3.752724475), (-22.513326989, -4.937380803), (-21.731218891, -5.30092632), (-20.538800155, -5.779648827), (-20.137325925, -5.928599802), (-19.528876591, -6.135464876), (-19.325056364, -6.201754934), (-18.915138447, -6.32828856), (-18.709169476, -6.388873867), (-18.503492991, -6.450235701)],
                knots=[0, 0, 0, 0, 0.015625, 0.015625, 0.03125, 0.03125, 0.0625, 0.125, 0.125, 0.1875, 0.1875, 0.25, 0.25, 0.28125, 0.28125, 0.3125, 0.3125, 0.375, 0.375, 0.40625, 0.40625, 0.421875, 0.421875, 0.4375, 0.4375, 0.46875, 0.46875, 0.5, 0.5, 0.53125, 0.53125, 0.546875, 0.546875, 0.5625, 0.5625, 0.59375, 0.59375, 0.609375, 0.609375, 0.625, 0.625, 0.6875, 0.6875, 0.703125, 0.703125, 0.71875, 0.71875, 0.75, 0.75, 0.78125, 0.78125, 0.796875, 0.796875, 0.8125, 0.8125, 0.84375, 0.84375, 0.875, 0.875, 0.90625, 0.90625, 0.9375, 0.9375, 0.96875, 0.96875, 0.984375, 0.984375, 0.9921875, 0.9921875, 0.99609375, 0.99609375, 1, 1, 1, 1], degree=3))
            ThreePointArc((-18.503492991, -6.450235701), (-9.568725534, -9.968188003), (-0.041286395, -11.165669263))
        make_face()
    extrude(amount=CORTAR_EXTRUIR6_DEPTH + CORTAR_EXTRUIR6_DEPTH_BACK, mode=Mode.SUBTRACT)


solid = part.part
